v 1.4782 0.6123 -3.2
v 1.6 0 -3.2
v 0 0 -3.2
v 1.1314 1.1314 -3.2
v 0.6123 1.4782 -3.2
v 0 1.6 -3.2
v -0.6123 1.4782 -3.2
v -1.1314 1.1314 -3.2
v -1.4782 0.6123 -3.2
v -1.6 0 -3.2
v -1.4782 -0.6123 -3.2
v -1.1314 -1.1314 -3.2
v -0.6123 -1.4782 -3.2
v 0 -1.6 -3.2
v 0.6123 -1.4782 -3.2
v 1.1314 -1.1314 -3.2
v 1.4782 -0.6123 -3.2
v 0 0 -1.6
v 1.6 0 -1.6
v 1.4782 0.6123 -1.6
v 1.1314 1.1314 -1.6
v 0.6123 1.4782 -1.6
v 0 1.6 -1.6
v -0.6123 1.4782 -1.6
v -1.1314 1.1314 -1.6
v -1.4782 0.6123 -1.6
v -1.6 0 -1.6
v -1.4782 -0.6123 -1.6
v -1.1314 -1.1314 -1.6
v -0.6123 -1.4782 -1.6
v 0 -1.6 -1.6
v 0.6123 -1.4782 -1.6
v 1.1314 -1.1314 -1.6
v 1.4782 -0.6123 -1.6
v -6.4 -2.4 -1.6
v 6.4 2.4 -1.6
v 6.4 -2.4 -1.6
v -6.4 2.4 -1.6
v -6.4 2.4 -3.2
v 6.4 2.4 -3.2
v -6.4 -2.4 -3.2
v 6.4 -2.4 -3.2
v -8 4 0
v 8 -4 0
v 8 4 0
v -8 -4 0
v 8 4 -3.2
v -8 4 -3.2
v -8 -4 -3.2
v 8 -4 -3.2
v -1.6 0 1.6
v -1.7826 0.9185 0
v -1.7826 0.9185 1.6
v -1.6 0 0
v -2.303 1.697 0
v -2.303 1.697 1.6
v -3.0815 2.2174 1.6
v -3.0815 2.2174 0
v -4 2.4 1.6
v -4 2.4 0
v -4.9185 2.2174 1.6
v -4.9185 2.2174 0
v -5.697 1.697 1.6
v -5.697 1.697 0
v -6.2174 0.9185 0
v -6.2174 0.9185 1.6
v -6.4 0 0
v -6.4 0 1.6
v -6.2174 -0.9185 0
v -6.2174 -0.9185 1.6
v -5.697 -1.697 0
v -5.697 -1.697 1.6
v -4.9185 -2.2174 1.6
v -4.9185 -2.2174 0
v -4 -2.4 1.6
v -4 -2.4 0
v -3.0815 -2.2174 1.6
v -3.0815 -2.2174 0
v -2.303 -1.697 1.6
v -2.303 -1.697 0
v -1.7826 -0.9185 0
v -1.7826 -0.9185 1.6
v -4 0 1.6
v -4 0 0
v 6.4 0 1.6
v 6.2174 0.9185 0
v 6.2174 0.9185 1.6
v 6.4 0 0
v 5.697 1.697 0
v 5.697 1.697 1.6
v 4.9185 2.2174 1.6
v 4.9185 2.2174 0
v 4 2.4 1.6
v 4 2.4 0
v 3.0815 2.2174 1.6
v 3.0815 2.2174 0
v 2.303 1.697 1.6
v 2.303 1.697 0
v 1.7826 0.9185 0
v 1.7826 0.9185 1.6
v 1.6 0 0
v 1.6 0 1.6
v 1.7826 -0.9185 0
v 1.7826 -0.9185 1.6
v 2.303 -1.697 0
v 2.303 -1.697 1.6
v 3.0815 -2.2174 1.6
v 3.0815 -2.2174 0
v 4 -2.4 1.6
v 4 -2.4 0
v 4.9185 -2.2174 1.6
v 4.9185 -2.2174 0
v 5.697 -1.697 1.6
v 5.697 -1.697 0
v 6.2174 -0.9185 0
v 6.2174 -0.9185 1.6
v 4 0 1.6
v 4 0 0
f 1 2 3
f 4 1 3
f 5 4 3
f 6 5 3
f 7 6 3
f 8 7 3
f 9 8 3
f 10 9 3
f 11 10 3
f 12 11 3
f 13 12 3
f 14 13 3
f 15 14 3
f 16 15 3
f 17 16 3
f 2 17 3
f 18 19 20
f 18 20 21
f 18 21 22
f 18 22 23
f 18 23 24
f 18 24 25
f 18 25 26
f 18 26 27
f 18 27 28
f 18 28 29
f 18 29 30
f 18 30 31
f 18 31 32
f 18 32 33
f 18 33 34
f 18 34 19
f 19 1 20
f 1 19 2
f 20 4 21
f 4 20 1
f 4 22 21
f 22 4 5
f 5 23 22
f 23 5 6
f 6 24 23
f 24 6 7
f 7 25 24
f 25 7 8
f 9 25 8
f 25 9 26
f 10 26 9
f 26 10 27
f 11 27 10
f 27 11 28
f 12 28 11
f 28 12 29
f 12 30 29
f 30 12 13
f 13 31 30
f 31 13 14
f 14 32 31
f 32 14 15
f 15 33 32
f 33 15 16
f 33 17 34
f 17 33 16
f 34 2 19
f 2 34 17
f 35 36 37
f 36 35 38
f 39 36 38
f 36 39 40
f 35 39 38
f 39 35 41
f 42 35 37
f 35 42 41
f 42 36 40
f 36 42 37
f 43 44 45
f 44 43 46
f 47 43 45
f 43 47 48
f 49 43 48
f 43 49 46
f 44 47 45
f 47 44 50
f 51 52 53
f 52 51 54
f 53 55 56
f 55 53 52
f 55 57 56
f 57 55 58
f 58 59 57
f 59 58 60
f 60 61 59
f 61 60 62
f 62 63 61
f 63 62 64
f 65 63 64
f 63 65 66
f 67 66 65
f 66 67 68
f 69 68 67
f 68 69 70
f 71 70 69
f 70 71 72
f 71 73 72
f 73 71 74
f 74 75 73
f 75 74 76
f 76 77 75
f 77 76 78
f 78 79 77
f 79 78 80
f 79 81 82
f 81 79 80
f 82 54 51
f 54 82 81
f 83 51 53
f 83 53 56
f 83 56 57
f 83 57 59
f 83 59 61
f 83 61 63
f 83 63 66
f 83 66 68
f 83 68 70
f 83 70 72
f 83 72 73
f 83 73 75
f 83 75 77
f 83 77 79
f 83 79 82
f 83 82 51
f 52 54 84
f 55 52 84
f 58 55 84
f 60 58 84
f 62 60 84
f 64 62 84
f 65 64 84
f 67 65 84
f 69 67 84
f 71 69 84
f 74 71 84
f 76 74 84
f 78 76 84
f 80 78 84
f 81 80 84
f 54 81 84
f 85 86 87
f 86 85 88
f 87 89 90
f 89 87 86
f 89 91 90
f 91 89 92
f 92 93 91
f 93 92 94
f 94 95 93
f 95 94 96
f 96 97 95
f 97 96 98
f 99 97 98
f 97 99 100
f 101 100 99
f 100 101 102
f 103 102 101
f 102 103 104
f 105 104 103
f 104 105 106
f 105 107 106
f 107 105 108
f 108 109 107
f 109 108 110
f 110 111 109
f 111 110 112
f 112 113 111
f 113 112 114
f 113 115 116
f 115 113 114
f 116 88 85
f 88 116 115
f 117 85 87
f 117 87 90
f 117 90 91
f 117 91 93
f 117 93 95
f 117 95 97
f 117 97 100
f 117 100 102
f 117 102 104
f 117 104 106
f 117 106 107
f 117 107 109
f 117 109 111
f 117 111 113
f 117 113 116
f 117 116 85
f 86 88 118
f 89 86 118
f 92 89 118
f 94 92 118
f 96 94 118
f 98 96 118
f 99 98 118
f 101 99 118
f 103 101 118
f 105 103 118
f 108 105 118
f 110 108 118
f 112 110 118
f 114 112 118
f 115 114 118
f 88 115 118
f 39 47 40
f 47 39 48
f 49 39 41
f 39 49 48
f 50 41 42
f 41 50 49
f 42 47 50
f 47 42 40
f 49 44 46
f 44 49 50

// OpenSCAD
// file: ../p/stud.scad
use <../lib.scad>
use <4-4cyli.scad>
use <4-4disc.scad>
use <4-4edge.scad>
function ldraw_lib__stud() = [
// 0 Stud
// 0 Name: stud.dat
// 0 Author: James Jessiman
// 0 !LDRAW_ORG Primitive UPDATE 2012-01
// 0 !LICENSE Licensed under CC BY 4.0 : see CAreadme.txt
// 
// 0 BFC CERTIFY CCW
  [0,"BFC","CERTIFY"],
  [0,"BFC","CCW"],
// 
// 0 !HISTORY 2002-04-04 [sbliss] Modified for BFC compliance
// 0 !HISTORY 2002-04-25 [PTadmin] Official Update 2002-02
// 0 !HISTORY 2007-06-24 [PTadmin] Header formatted for Contributor Agreement
// 0 !HISTORY 2008-07-01 [PTadmin] Official Update 2008-01
// 0 !HISTORY 2012-02-16 [Philo] Changed to CCW
// 0 !HISTORY 2012-03-30 [PTadmin] Official Update 2012-01
// 
// 
// 1 16 0 0 0 6 0 0 0 1 0 0 0 6 4-4edge.dat
  [1,16,0,0,0,6,0,0,0,1,0,0,0,6, ldraw_lib__4_4edge()],
// 1 16 0 -4 0 6 0 0 0 1 0 0 0 6 4-4edge.dat
  [1,16,0,-4,0,6,0,0,0,1,0,0,0,6, ldraw_lib__4_4edge()],
// 1 16 0 0 0 6 0 0 0 -4 0 0 0 6 4-4cyli.dat
  [1,16,0,0,0,6,0,0,0,-4,0,0,0,6, ldraw_lib__4_4cyli()],
// 1 16 0 -4 0 6 0 0 0 1 0 0 0 6 4-4disc.dat
  [1,16,0,-4,0,6,0,0,0,1,0,0,0,6, ldraw_lib__4_4disc()],
  [-1,16,0,0,0,6,0,0,0,-1,0,0,0,6, ldraw_lib__4_4disc()],
];
module ldraw_lib__stud(step=0, col=false, unit=2/5, alt=false, line=0.2, solid=!$preview)
    makepoly(ldraw_lib__stud(), step=step, col=col, unit=unit, alt=alt, line=line, solid=solid);
ldraw_lib__stud(line=0.2);
// file: ../p/4-4edge.scad
use <../lib.scad>
function ldraw_lib__4_4edge() = [
// 0 Circle 1.0
// 0 Name: 4-4edge.dat
// 0 Author: James Jessiman
// 0 !LDRAW_ORG Primitive UPDATE 2017-01
// 0 !LICENSE Licensed under CC BY 2.0 and CC BY 4.0 : see CAreadme.txt
// 
// 0 BFC CERTIFY CCW
  [0,"BFC","CERTIFY"],
  [0,"BFC","CCW"],
// 
// 0 !HISTORY 1998-12-15 [PTadmin] Official Update 1998-10
// 0 !HISTORY 2005-12-28 [PTadmin] Official Update 2005-01
// 0 !HISTORY 2007-06-24 [PTadmin] Header formatted for Contributor Agreement
// 0 !HISTORY 2008-07-01 [PTadmin] Official Update 2008-01
// 0 !HISTORY 2017-01-15 [Steffen] BFCed
// 0 !HISTORY 2017-12-30 [PTadmin] Official Update 2017-01
// 
// 
// 2 24 1 0 0 0.9239 0 0.3827
  [2,24,1,0,0,0.9239,0,0.3827],
// 2 24 0.9239 0 0.3827 0.7071 0 0.7071
  [2,24,0.9239,0,0.3827,0.7071,0,0.7071],
// 2 24 0.7071 0 0.7071 0.3827 0 0.9239
  [2,24,0.7071,0,0.7071,0.3827,0,0.9239],
// 2 24 0.3827 0 0.9239 0 0 1
  [2,24,0.3827,0,0.9239,0,0,1],
// 2 24 0 0 1 -0.3827 0 0.9239
  [2,24,0,0,1,-0.3827,0,0.9239],
// 2 24 -0.3827 0 0.9239 -0.7071 0 0.7071
  [2,24,-0.3827,0,0.9239,-0.7071,0,0.7071],
// 2 24 -0.7071 0 0.7071 -0.9239 0 0.3827
  [2,24,-0.7071,0,0.7071,-0.9239,0,0.3827],
// 2 24 -0.9239 0 0.3827 -1 0 -0
  [2,24,-0.9239,0,0.3827,-1,0,-0],
// 2 24 -1 0 -0 -0.9239 0 -0.3827
  [2,24,-1,0,-0,-0.9239,0,-0.3827],
// 2 24 -0.9239 0 -0.3827 -0.7071 0 -0.7071
  [2,24,-0.9239,0,-0.3827,-0.7071,0,-0.7071],
// 2 24 -0.7071 0 -0.7071 -0.3827 0 -0.9239
  [2,24,-0.7071,0,-0.7071,-0.3827,0,-0.9239],
// 2 24 -0.3827 0 -0.9239 0 0 -1
  [2,24,-0.3827,0,-0.9239,0,0,-1],
// 2 24 0 0 -1 0.3827 0 -0.9239
  [2,24,0,0,-1,0.3827,0,-0.9239],
// 2 24 0.3827 0 -0.9239 0.7071 0 -0.7071
  [2,24,0.3827,0,-0.9239,0.7071,0,-0.7071],
// 2 24 0.7071 0 -0.7071 0.9239 0 -0.3827
  [2,24,0.7071,0,-0.7071,0.9239,0,-0.3827],
// 2 24 0.9239 0 -0.3827 1 0 0
  [2,24,0.9239,0,-0.3827,1,0,0],
];
module ldraw_lib__4_4edge(step=0, col=false, unit=2/5, alt=false, line=0.2, solid=!$preview)
    makepoly(ldraw_lib__4_4edge(), step=step, col=col, unit=unit, alt=alt, line=line, solid=solid);
ldraw_lib__4_4edge(line=0.2);
// file: ../p/4-4disc.scad
use <../lib.scad>
function ldraw_lib__4_4disc() = [
// 0 Disc 1.0
// 0 Name: 4-4disc.dat
// 0 Author: James Jessiman
// 0 !LDRAW_ORG Primitive UPDATE 2002-02
// 0 !LICENSE Licensed under CC BY 2.0 and CC BY 4.0 : see CAreadme.txt
// 
// 0 BFC CERTIFY CCW
  [0,"BFC","CERTIFY"],
  [0,"BFC","CCW"],
// 
// 0 !HISTORY 1998-12-15 [PTadmin] Official Update 1998-10
// 0 !HISTORY 2002-03-23 [sbliss] Added BFC statement
// 0 !HISTORY 2002-04-25 [PTadmin] Official Update 2002-02
// 0 !HISTORY 2007-06-24 [PTadmin] Header formatted for Contributor Agreement
// 0 !HISTORY 2008-07-01 [PTadmin] Official Update 2008-01
// 
// 
// 3 16 0 0 0 1 0 0 0.9239 0 0.3827
  [3,16,0,0,0,1,0,0,0.9239,0,0.3827],
// 3 16 0 0 0 0.9239 0 0.3827 0.7071 0 0.7071
  [3,16,0,0,0,0.9239,0,0.3827,0.7071,0,0.7071],
// 3 16 0 0 0 0.7071 0 0.7071 0.3827 0 0.9239
  [3,16,0,0,0,0.7071,0,0.7071,0.3827,0,0.9239],
// 3 16 0 0 0 0.3827 0 0.9239 0 0 1
  [3,16,0,0,0,0.3827,0,0.9239,0,0,1],
// 3 16 0 0 0 0 0 1 -0.3827 0 0.9239
  [3,16,0,0,0,0,0,1,-0.3827,0,0.9239],
// 3 16 0 0 0 -0.3827 0 0.9239 -0.7071 0 0.7071
  [3,16,0,0,0,-0.3827,0,0.9239,-0.7071,0,0.7071],
// 3 16 0 0 0 -0.7071 0 0.7071 -0.9239 0 0.3827
  [3,16,0,0,0,-0.7071,0,0.7071,-0.9239,0,0.3827],
// 3 16 0 0 0 -0.9239 0 0.3827 -1 0 -0
  [3,16,0,0,0,-0.9239,0,0.3827,-1,0,-0],
// 3 16 0 0 0 -1 0 -0 -0.9239 0 -0.3827
  [3,16,0,0,0,-1,0,-0,-0.9239,0,-0.3827],
// 3 16 0 0 0 -0.9239 0 -0.3827 -0.7071 0 -0.7071
  [3,16,0,0,0,-0.9239,0,-0.3827,-0.7071,0,-0.7071],
// 3 16 0 0 0 -0.7071 0 -0.7071 -0.3827 0 -0.9239
  [3,16,0,0,0,-0.7071,0,-0.7071,-0.3827,0,-0.9239],
// 3 16 0 0 0 -0.3827 0 -0.9239 0 0 -1
  [3,16,0,0,0,-0.3827,0,-0.9239,0,0,-1],
// 3 16 0 0 0 0 0 -1 0.3827 0 -0.9239
  [3,16,0,0,0,0,0,-1,0.3827,0,-0.9239],
// 3 16 0 0 0 0.3827 0 -0.9239 0.7071 0 -0.7071
  [3,16,0,0,0,0.3827,0,-0.9239,0.7071,0,-0.7071],
// 3 16 0 0 0 0.7071 0 -0.7071 0.9239 0 -0.3827
  [3,16,0,0,0,0.7071,0,-0.7071,0.9239,0,-0.3827],
// 3 16 0 0 0 0.9239 0 -0.3827 1 0 0
  [3,16,0,0,0,0.9239,0,-0.3827,1,0,0],
// 0
];
module ldraw_lib__4_4disc(step=0, col=false, unit=2/5, alt=false, line=0.2, solid=!$preview)
    makepoly(ldraw_lib__4_4disc(), step=step, col=col, unit=unit, alt=alt, line=line, solid=solid);
ldraw_lib__4_4disc(line=0.2);
// file: ../p/4-4cyli.scad
use <../lib.scad>
$fa=1; $fs=0.2;
function ldraw_lib__4_4cyli(realsolid=false) = [
// 0 Cylinder 1.0
// 0 Name: 4-4cyli.dat
// 0 Author: James Jessiman
// 0 !LDRAW_ORG Primitive UPDATE 2005-01
// 0 !LICENSE Licensed under CC BY 2.0 and CC BY 4.0 : see CAreadme.txt
// 
// 0 BFC CERTIFY CCW
  [0,"BFC","CERTIFY"],
  [0,"BFC","CCW"],
// 
// 0 !HISTORY 1998-12-15 [PTadmin] Official Update 1998-10
// 0 !HISTORY 2002-03-23 [sbliss] Added BFC statement; merged headers from files in distributions LDraw 0.27 and Complete.
// 0 !HISTORY 2002-04-25 [PTadmin] Official Update 2002-02
// 0 !HISTORY 2004-12-14 [guyvivan] BFC CCW
// 0 !HISTORY 2005-12-28 [PTadmin] Official Update 2005-01
// 0 !HISTORY 2007-06-24 [PTadmin] Header formatted for Contributor Agreement
// 0 !HISTORY 2008-07-01 [PTadmin] Official Update 2008-01
// 
// 
// 4 16 1 1 0 0.9239 1 0.3827 0.9239 0 0.3827 1 0 0
  [4,16,1,1,0,0.9239,1,0.3827,0.9239,0,0.3827,1,0,0],
// 5 24 1 0 0 1 1 0 0.9239 0 0.3827 0.9239 0 -0.3827
  [5,24,1,0,0,1,1,0,0.9239,0,0.3827,0.9239,0,-0.3827],
// 4 16 0.9239 1 0.3827 0.7071 1 0.7071 0.7071 0 0.7071 0.9239 0 0.3827
  [4,16,0.9239,1,0.3827,0.7071,1,0.7071,0.7071,0,0.7071,0.9239,0,0.3827],
// 5 24 0.9239 0 0.3827 0.9239 1 0.3827 0.7071 0 0.7071 1 0 0
  [5,24,0.9239,0,0.3827,0.9239,1,0.3827,0.7071,0,0.7071,1,0,0],
// 4 16 0.7071 1 0.7071 0.3827 1 0.9239 0.3827 0 0.9239 0.7071 0 0.7071
  [4,16,0.7071,1,0.7071,0.3827,1,0.9239,0.3827,0,0.9239,0.7071,0,0.7071],
// 5 24 0.7071 0 0.7071 0.7071 1 0.7071 0.3827 0 0.9239 0.9239 0 0.3827
  [5,24,0.7071,0,0.7071,0.7071,1,0.7071,0.3827,0,0.9239,0.9239,0,0.3827],
// 4 16 0.3827 1 0.9239 0 1 1 0 0 1 0.3827 0 0.9239
  [4,16,0.3827,1,0.9239,0,1,1,0,0,1,0.3827,0,0.9239],
// 5 24 0.3827 0 0.9239 0.3827 1 0.9239 0 0 1 0.7071 0 0.7071
  [5,24,0.3827,0,0.9239,0.3827,1,0.9239,0,0,1,0.7071,0,0.7071],
// 4 16 0 1 1 -0.3827 1 0.9239 -0.3827 0 0.9239 0 0 1
  [4,16,0,1,1,-0.3827,1,0.9239,-0.3827,0,0.9239,0,0,1],
// 5 24 0 0 1 0 1 1 -0.3827 0 0.9239 0.3827 0 0.9239
  [5,24,0,0,1,0,1,1,-0.3827,0,0.9239,0.3827,0,0.9239],
// 4 16 -0.3827 1 0.9239 -0.7071 1 0.7071 -0.7071 0 0.7071 -0.3827 0 0.9239
  [4,16,-0.3827,1,0.9239,-0.7071,1,0.7071,-0.7071,0,0.7071,-0.3827,0,0.9239],
// 5 24 -0.3827 0 0.9239 -0.3827 1 0.9239 -0.7071 0 0.7071 0 0 1
  [5,24,-0.3827,0,0.9239,-0.3827,1,0.9239,-0.7071,0,0.7071,0,0,1],
// 4 16 -0.7071 1 0.7071 -0.9239 1 0.3827 -0.9239 0 0.3827 -0.7071 0 0.7071
  [4,16,-0.7071,1,0.7071,-0.9239,1,0.3827,-0.9239,0,0.3827,-0.7071,0,0.7071],
// 5 24 -0.7071 0 0.7071 -0.7071 1 0.7071 -0.9239 0 0.3827 -0.3827 0 0.9239
  [5,24,-0.7071,0,0.7071,-0.7071,1,0.7071,-0.9239,0,0.3827,-0.3827,0,0.9239],
// 4 16 -0.9239 1 0.3827 -1 1 0 -1 0 0 -0.9239 0 0.3827
  [4,16,-0.9239,1,0.3827,-1,1,0,-1,0,0,-0.9239,0,0.3827],
// 5 24 -0.9239 0 0.3827 -0.9239 1 0.3827 -1 0 0 -0.7071 0 0.7071
  [5,24,-0.9239,0,0.3827,-0.9239,1,0.3827,-1,0,0,-0.7071,0,0.7071],
// 4 16 -1 1 0 -0.9239 1 -0.3827 -0.9239 0 -0.3827 -1 0 0
  [4,16,-1,1,0,-0.9239,1,-0.3827,-0.9239,0,-0.3827,-1,0,0],
// 5 24 -1 0 0 -1 1 0 -0.9239 0 -0.3827 -0.9239 0 0.3827
  [5,24,-1,0,0,-1,1,0,-0.9239,0,-0.3827,-0.9239,0,0.3827],
// 4 16 -0.9239 1 -0.3827 -0.7071 1 -0.7071 -0.7071 0 -0.7071 -0.9239 0 -0.3827
  [4,16,-0.9239,1,-0.3827,-0.7071,1,-0.7071,-0.7071,0,-0.7071,-0.9239,0,-0.3827],
// 5 24 -0.9239 0 -0.3827 -0.9239 1 -0.3827 -0.7071 0 -0.7071 -1 0 0
  [5,24,-0.9239,0,-0.3827,-0.9239,1,-0.3827,-0.7071,0,-0.7071,-1,0,0],
// 4 16 -0.7071 1 -0.7071 -0.3827 1 -0.9239 -0.3827 0 -0.9239 -0.7071 0 -0.7071
  [4,16,-0.7071,1,-0.7071,-0.3827,1,-0.9239,-0.3827,0,-0.9239,-0.7071,0,-0.7071],
// 5 24 -0.7071 0 -0.7071 -0.7071 1 -0.7071 -0.3827 0 -0.9239 -0.9239 0 -0.3827
  [5,24,-0.7071,0,-0.7071,-0.7071,1,-0.7071,-0.3827,0,-0.9239,-0.9239,0,-0.3827],
// 4 16 -0.3827 1 -0.9239 0 1 -1 0 0 -1 -0.3827 0 -0.9239
  [4,16,-0.3827,1,-0.9239,0,1,-1,0,0,-1,-0.3827,0,-0.9239],
// 5 24 -0.3827 0 -0.9239 -0.3827 1 -0.9239 0 0 -1 -0.7071 0 -0.7071
  [5,24,-0.3827,0,-0.9239,-0.3827,1,-0.9239,0,0,-1,-0.7071,0,-0.7071],
// 4 16 0 1 -1 0.3827 1 -0.9239 0.3827 0 -0.9239 0 0 -1
  [4,16,0,1,-1,0.3827,1,-0.9239,0.3827,0,-0.9239,0,0,-1],
// 5 24 0 0 -1 0 1 -1 0.3827 0 -0.9239 -0.3827 0 -0.9239
  [5,24,0,0,-1,0,1,-1,0.3827,0,-0.9239,-0.3827,0,-0.9239],
// 4 16 0.3827 1 -0.9239 0.7071 1 -0.7071 0.7071 0 -0.7071 0.3827 0 -0.9239
  [4,16,0.3827,1,-0.9239,0.7071,1,-0.7071,0.7071,0,-0.7071,0.3827,0,-0.9239],
// 5 24 0.3827 0 -0.9239 0.3827 1 -0.9239 0.7071 0 -0.7071 0 0 -1
  [5,24,0.3827,0,-0.9239,0.3827,1,-0.9239,0.7071,0,-0.7071,0,0,-1],
// 4 16 0.7071 1 -0.7071 0.9239 1 -0.3827 0.9239 0 -0.3827 0.7071 0 -0.7071
  [4,16,0.7071,1,-0.7071,0.9239,1,-0.3827,0.9239,0,-0.3827,0.7071,0,-0.7071],
// 5 24 0.7071 0 -0.7071 0.7071 1 -0.7071 0.9239 0 -0.3827 0.3827 0 -0.9239
  [5,24,0.7071,0,-0.7071,0.7071,1,-0.7071,0.9239,0,-0.3827,0.3827,0,-0.9239],
// 4 16 0.9239 1 -0.3827 1 1 0 1 0 0 0.9239 0 -0.3827
  [4,16,0.9239,1,-0.3827,1,1,0,1,0,0,0.9239,0,-0.3827],
// 5 24 0.9239 0 -0.3827 0.9239 1 -0.3827 1 0 0 0.7071 0 -0.7071
  [5,24,0.9239,0,-0.3827,0.9239,1,-0.3827,1,0,0,0.7071,0,-0.7071],
// 0
];
module ldraw_lib__4_4cyli(step=0, col=false, unit=2/5, alt=false, line=0.2, solid=!$preview)
    makepoly(ldraw_lib__4_4cyli(solid), step=step, col=col, unit=unit, alt=alt, line=line, solid=solid);
ldraw_lib__4_4cyli(line=0.2);
// file: ../p/stug-1x2.scad
use <../lib.scad>
use <stud.scad>
$fa=1; $fs=0.2;
function ldraw_lib__stug_1x2(realsolid=false) = [
// 0 Stud Group  1 x  2
// 0 Name: stug-1x2.dat
// 0 Author: Steffen [Steffen]
// 0 !LDRAW_ORG Primitive UPDATE 2011-01
// 0 !LICENSE Licensed under CC BY 2.0 and CC BY 4.0 : see CAreadme.txt
// 
// 0 BFC CERTIFY CCW
  [0,"BFC","CERTIFY"],
  [0,"BFC","CCW"],
// 
// 0 !HISTORY 2011-07-25 [PTadmin] Official Update 2011-01
// 
// 
// 1 16 -10 0 0 1 0 0 0 1 0 0 0 1 stud.dat
  [1,16,-10,0,0,1,0,0,0,1,0,0,0,1, ldraw_lib__stud(realsolid)],
// 1 16 10 0 0 1 0 0 0 1 0 0 0 1 stud.dat
  [1,16,10,0,0,1,0,0,0,1,0,0,0,1, ldraw_lib__stud(realsolid)],
];
module ldraw_lib__stug_1x2(step=0, col=false, unit=2/5, alt=false, line=0.2, solid=!$preview)
    makepoly(ldraw_lib__stug_1x2(solid), step=step, col=col, unit=unit, alt=alt, line=line, solid=solid);
ldraw_lib__stug_1x2(line=0.2);
// file: ../p/stud3.scad
use <../lib.scad>
use <4-4cyli.scad>
use <4-4disc.scad>
use <4-4edge.scad>
function ldraw_lib__stud3() = [
// 0 Stud Tube Solid
// 0 Name: stud3.dat
// 0 Author: James Jessiman
// 0 !LDRAW_ORG Primitive UPDATE 2012-01
// 0 !LICENSE Licensed under CC BY 4.0 : see CAreadme.txt
// 
// 0 BFC CERTIFY CCW
  [0,"BFC","CERTIFY"],
  [0,"BFC","CCW"],
// 
// 0 !HISTORY 2002-04-04 [sbliss] Modified for BFC compliance
// 0 !HISTORY 2002-04-25 [PTadmin] Official Update 2002-02
// 0 !HISTORY 2007-06-24 [PTadmin] Header formatted for Contributor Agreement
// 0 !HISTORY 2008-07-01 [PTadmin] Official Update 2008-01
// 0 !HISTORY 2012-02-16 [Philo] Changed to CCW
// 0 !HISTORY 2012-03-30 [PTadmin] Official Update 2012-01
// 
// 
// 1 16 0 -4 0 4 0 0 0 1 0 0 0 4 4-4edge.dat
  [1,16,0,-4,0,4,0,0,0,1,0,0,0,4, ldraw_lib__4_4edge()],
// 1 16 0 0 0 4 0 0 0 1 0 0 0 4 4-4edge.dat
  [1,16,0,0,0,4,0,0,0,1,0,0,0,4, ldraw_lib__4_4edge()],
// 1 16 0 -4 0 4 0 0 0 1 0 0 0 4 4-4disc.dat
  [1,16,0,-4,0,4,0,0,0,1,0,0,0,4, ldraw_lib__4_4disc()],
  [-1,16,0,0,0,4,0,0,0,-1,0,0,0,4, ldraw_lib__4_4disc()],
// 1 16 0 -4 0 4 0 0 0 4 0 0 0 4 4-4cyli.dat
  [1,16,0,-4,0,4,0,0,0,4,0,0,0,4, ldraw_lib__4_4cyli()],
];
module ldraw_lib__stud3(step=0, col=false, unit=2/5, alt=false, line=0.2, solid=!$preview)
    makepoly(ldraw_lib__stud3(), step=step, col=col, unit=unit, alt=alt, line=line, solid=solid);
ldraw_lib__stud3(line=0.2);
// file: ../p/box5.scad
use <../lib.scad>
function ldraw_lib__box5() = [
// 0 Box with 5 Faces and All Edges
// 0 Name: box5.dat
// 0 Author: James Jessiman
// 0 !LDRAW_ORG Primitive UPDATE 2012-01
// 0 !LICENSE Licensed under CC BY 2.0 and CC BY 4.0 : see CAreadme.txt
// 
// 0 BFC CERTIFY CCW
  [0,"BFC","CERTIFY"],
  [0,"BFC","CCW"],
// 
// 0 !HISTORY 2002-04-03 [sbliss] Modified for BFC compliance
// 0 !HISTORY 2002-04-25 [PTadmin] Official Update 2002-02
// 0 !HISTORY 2007-06-24 [PTadmin] Header formatted for Contributor Agreement
// 0 !HISTORY 2008-07-01 [PTadmin] Official Update 2008-01
// 0 !HISTORY 2012-02-16 [Philo] Changed to CCW
// 0 !HISTORY 2012-03-30 [PTadmin] Official Update 2012-01
// 
// 
// 2 24 1 1 1 -1 1 1
  [2,24,1,1,1,-1,1,1],
// 2 24 -1 1 1 -1 1 -1
  [2,24,-1,1,1,-1,1,-1],
// 2 24 -1 1 -1 1 1 -1
  [2,24,-1,1,-1,1,1,-1],
// 2 24 1 1 -1 1 1 1
  [2,24,1,1,-1,1,1,1],
// 2 24 1 0 1 -1 0 1
  [2,24,1,0,1,-1,0,1],
// 2 24 -1 0 1 -1 0 -1
  [2,24,-1,0,1,-1,0,-1],
// 2 24 -1 0 -1 1 0 -1
  [2,24,-1,0,-1,1,0,-1],
// 2 24 1 0 -1 1 0 1
  [2,24,1,0,-1,1,0,1],
// 2 24 1 0 1 1 1 1
  [2,24,1,0,1,1,1,1],
// 2 24 -1 0 1 -1 1 1
  [2,24,-1,0,1,-1,1,1],
// 2 24 1 0 -1 1 1 -1
  [2,24,1,0,-1,1,1,-1],
// 2 24 -1 0 -1 -1 1 -1
  [2,24,-1,0,-1,-1,1,-1],
// 4 16 -1 1 1 1 1 1 1 1 -1 -1 1 -1
  [4,16,-1,1,1,1,1,1,1,1,-1,-1,1,-1],
// 4 16 -1 1 1 -1 0 1 1 0 1 1 1 1
  [4,16,-1,1,1,-1,0,1,1,0,1,1,1,1],
// 4 16 -1 1 -1 -1 0 -1 -1 0 1 -1 1 1
  [4,16,-1,1,-1,-1,0,-1,-1,0,1,-1,1,1],
// 4 16 1 1 -1 1 0 -1 -1 0 -1 -1 1 -1
  [4,16,1,1,-1,1,0,-1,-1,0,-1,-1,1,-1],
// 4 16 1 1 1 1 0 1 1 0 -1 1 1 -1
  [4,16,1,1,1,1,0,1,1,0,-1,1,1,-1],
];
makepoly(ldraw_lib__box5(), line=0.2);
// file: ../p/box4t.scad
use <../lib.scad>
function ldraw_lib__box4t() = [
// 0 Box with 4 Adjacent Faces and All Edges
// 0 Name: box4t.dat
// 0 Author: Tore Eriksson [Tore_Eriksson]
// 0 !LDRAW_ORG Primitive UPDATE 2003-02
// 0 !LICENSE Licensed under CC BY 2.0 and CC BY 4.0 : see CAreadme.txt
// 
// 0 BFC CERTIFY CCW
  [0,"BFC","CERTIFY"],
  [0,"BFC","CCW"],
// 
// 0 !HISTORY 1997-09-29 [PTadmin] Official Update 1997-15
// 0 !HISTORY 2002-08-31 [izanette] Modified with WINDZ for BFC compliance
// 0 !HISTORY 2003-08-01 [PTadmin] Official Update 2003-02
// 0 !HISTORY 2007-06-24 [PTadmin] Header formatted for Contributor Agreement
// 0 !HISTORY 2008-07-01 [PTadmin] Official Update 2008-01
// 
// 
// 2 24 1 1 1 -1 1 1
  [2,24,1,1,1,-1,1,1],
// 2 24 -1 1 1 -1 1 -1
  [2,24,-1,1,1,-1,1,-1],
// 2 24 -1 1 -1 1 1 -1
  [2,24,-1,1,-1,1,1,-1],
// 2 24 1 1 -1 1 1 1
  [2,24,1,1,-1,1,1,1],
// 2 24 1 0 1 -1 0 1
  [2,24,1,0,1,-1,0,1],
// 2 24 -1 0 1 -1 0 -1
  [2,24,-1,0,1,-1,0,-1],
// 2 24 -1 0 -1 1 0 -1
  [2,24,-1,0,-1,1,0,-1],
// 2 24 1 0 -1 1 0 1
  [2,24,1,0,-1,1,0,1],
// 2 24 1 0 1 1 1 1
  [2,24,1,0,1,1,1,1],
// 2 24 -1 0 1 -1 1 1
  [2,24,-1,0,1,-1,1,1],
// 2 24 1 0 -1 1 1 -1
  [2,24,1,0,-1,1,1,-1],
// 2 24 -1 0 -1 -1 1 -1
  [2,24,-1,0,-1,-1,1,-1],
// 4 16 1 1 1 1 1 -1 -1 1 -1 -1 1 1
  [4,16,1,1,1,1,1,-1,-1,1,-1,-1,1,1],
// 4 16 1 1 1 -1 1 1 -1 0 1 1 0 1
  [4,16,1,1,1,-1,1,1,-1,0,1,1,0,1],
// 4 16 -1 1 1 -1 1 -1 -1 0 -1 -1 0 1
  [4,16,-1,1,1,-1,1,-1,-1,0,-1,-1,0,1],
// 0 4 16 -1 1 -1 -1 0 -1 1 0 -1 1 1 -1
// 4 16 1 1 -1 1 1 1 1 0 1 1 0 -1
  [4,16,1,1,-1,1,1,1,1,0,1,1,0,-1],
// 0
];
makepoly(ldraw_lib__box4t(), line=0.2);
// file: s/3023bs01.scad
use <../../lib.scad>
use <../../p/box4t.scad>
use <../../p/box5.scad>
use <../../p/stud3.scad>
use <../../p/stug-1x2.scad>
function ldraw_lib__s__3023bs01() = [
// 0 ~Plate  1 x  2 without Front Face
// 0 Name: s\3023bs01.dat
// 0 Author: Massimo Maso [Sirio]
// 0 !LDRAW_ORG Subpart UPDATE 2023-03
// 0 !LICENSE Licensed under CC BY 4.0 : see CAreadme.txt
// 
// 0 BFC CERTIFY CCW
  [0,"BFC","CERTIFY"],
  [0,"BFC","CCW"],
// 
// 0 !HISTORY 2022-01-14 [PTadmin] Official Update 2022-01
// 0 !HISTORY 2023-05-27 [OrionP] Moved from s\3023s01.dat
// 0 !HISTORY 2023-06-24 [OrionP] Official Update 2023-03
// 
// 
// 0 // Primitves
// 1 16 0 4 0 1 0 0 0 -1 0 0 0 1 stud3.dat
  [1,16,0,4,0,1,0,0,0,-1,0,0,0,1, ldraw_lib__stud3()],
// 0 BFC INVERTNEXT
  [0,"BFC","INVERTNEXT"],
// 1 16 0 8 0 16 0 0 0 -4 0 0 0 6 box5.dat
  [1,16,0,8,0,16,0,0,0,-4,0,0,0,6, ldraw_lib__box5()],
// 1 16 0 8 0 20 0 0 0 -8 0 0 0 10 box4t.dat
  [1,16,0,8,0,20,0,0,0,-8,0,0,0,10, ldraw_lib__box4t()],
// 1 16 0 0 0 1 0 0 0 1 0 0 0 1 stug-1x2.dat
  [1,16,0,0,0,1,0,0,0,1,0,0,0,1, ldraw_lib__stug_1x2()],
// 0 // Faces
// 4 16 20 8 10 16 8 6 -16 8 6 -20 8 10
  [4,16,20,8,10,16,8,6,-16,8,6,-20,8,10],
// 4 16 -20 8 10 -16 8 6 -16 8 -6 -20 8 -10
  [4,16,-20,8,10,-16,8,6,-16,8,-6,-20,8,-10],
// 4 16 -20 8 -10 -16 8 -6 16 8 -6 20 8 -10
  [4,16,-20,8,-10,-16,8,-6,16,8,-6,20,8,-10],
// 4 16 20 8 -10 16 8 -6 16 8 6 20 8 10
  [4,16,20,8,-10,16,8,-6,16,8,6,20,8,10],
];
module ldraw_lib__s__3023bs01(step=0, col=false, unit=2/5, alt=false, line=0.2, solid=!$preview)
    makepoly(ldraw_lib__s__3023bs01(), step=step, col=col, unit=unit, alt=alt, line=line, solid=solid);
ldraw_lib__s__3023bs01(line=0.2);
// file: 3023bpb0.scad
use <../lib.scad>
use <s/3023bs01.scad>
function ldraw_lib__3023bpb0() = [
// 0 Plate  1 x  2 with Metallic Gold Front Face Pattern
// 0 Name: 3023bpb0.dat
// 0 Author: Massimo Maso [Sirio]
// 0 !LDRAW_ORG Part UPDATE 2023-04
// 0 !LICENSE Licensed under CC BY 4.0 : see CAreadme.txt
// 
// 0 BFC CERTIFY CCW
  [0,"BFC","CERTIFY"],
  [0,"BFC","CCW"],
// 
// 0 !KEYWORDS Bricklink 3023pb02, Iron Man, Marvel, Rebrickable 3023pr0001
// 0 !KEYWORDS Set 76165, Superheroes
// 
// 0 !HISTORY 2022-01-14 [PTadmin] Official Update 2022-01
// 0 !HISTORY 2023-05-27 [OrionP] Moved from 3023pb0.dat
// 0 !HISTORY 2023-05-28 [MagFors] Corrected colour
// 0 !HISTORY 2023-08-25 [OrionP] Official Update 2023-04
// 
// 
// 0 // Subparts
// 1 16 0 0 0 1 0 0 0 1 0 0 0 1 s\3023bs01.dat
  [1,16,0,0,0,1,0,0,0,1,0,0,0,1, ldraw_lib__s__3023bs01()],
// 0 // Patterned face
// 4 82 -20 0 -10 -20 8 -10 20 8 -10 20 0 -10
  [4,82,-20,0,-10,-20,8,-10,20,8,-10,20,0,-10],
];
module ldraw_lib__3023bpb0(step=0, col=false, unit=2/5, alt=false, line=0.2, solid=!$preview)
    makepoly(ldraw_lib__3023bpb0(), step=step, col=col, unit=unit, alt=alt, line=line, solid=solid);
ldraw_lib__3023bpb0(line=0.2);
// main file
use <../lib.scad>
use <3023bpb0.scad>
function ldraw_lib__3023pb0() = [
// 0 ~Moved to 3023bpb0
// 0 Name: 3023pb0.dat
// 0 Author: Orion Pobursky [OrionP]
// 0 !LDRAW_ORG Part UPDATE 2024-07
// 0 !LICENSE Licensed under CC BY 4.0 : see CAreadme.txt
// 
// 0 BFC CERTIFY CCW
  [0,"BFC","CERTIFY"],
  [0,"BFC","CCW"],
// 
// 0 !HISTORY 2023-08-25 [OrionP] Official Update 2023-04
// 0 !HISTORY 2024-08-10 [MagFors] Update description
// 0 !HISTORY 2024-08-26 [OrionP] Official Update 2024-07
// 
// 1 16 0 0 0 1 0 0 0 1 0 0 0 1 3023bpb0.dat
  [1,16,0,0,0,1,0,0,0,1,0,0,0,1, ldraw_lib__3023bpb0()],
];
module ldraw_lib__3023pb0(step=0, col=false, unit=2/5, alt=false, line=0.2, solid=!$preview)
    makepoly(ldraw_lib__3023pb0(), step=step, col=col, unit=unit, alt=alt, line=line, solid=solid);
ldraw_lib__3023pb0(line=0.2);
